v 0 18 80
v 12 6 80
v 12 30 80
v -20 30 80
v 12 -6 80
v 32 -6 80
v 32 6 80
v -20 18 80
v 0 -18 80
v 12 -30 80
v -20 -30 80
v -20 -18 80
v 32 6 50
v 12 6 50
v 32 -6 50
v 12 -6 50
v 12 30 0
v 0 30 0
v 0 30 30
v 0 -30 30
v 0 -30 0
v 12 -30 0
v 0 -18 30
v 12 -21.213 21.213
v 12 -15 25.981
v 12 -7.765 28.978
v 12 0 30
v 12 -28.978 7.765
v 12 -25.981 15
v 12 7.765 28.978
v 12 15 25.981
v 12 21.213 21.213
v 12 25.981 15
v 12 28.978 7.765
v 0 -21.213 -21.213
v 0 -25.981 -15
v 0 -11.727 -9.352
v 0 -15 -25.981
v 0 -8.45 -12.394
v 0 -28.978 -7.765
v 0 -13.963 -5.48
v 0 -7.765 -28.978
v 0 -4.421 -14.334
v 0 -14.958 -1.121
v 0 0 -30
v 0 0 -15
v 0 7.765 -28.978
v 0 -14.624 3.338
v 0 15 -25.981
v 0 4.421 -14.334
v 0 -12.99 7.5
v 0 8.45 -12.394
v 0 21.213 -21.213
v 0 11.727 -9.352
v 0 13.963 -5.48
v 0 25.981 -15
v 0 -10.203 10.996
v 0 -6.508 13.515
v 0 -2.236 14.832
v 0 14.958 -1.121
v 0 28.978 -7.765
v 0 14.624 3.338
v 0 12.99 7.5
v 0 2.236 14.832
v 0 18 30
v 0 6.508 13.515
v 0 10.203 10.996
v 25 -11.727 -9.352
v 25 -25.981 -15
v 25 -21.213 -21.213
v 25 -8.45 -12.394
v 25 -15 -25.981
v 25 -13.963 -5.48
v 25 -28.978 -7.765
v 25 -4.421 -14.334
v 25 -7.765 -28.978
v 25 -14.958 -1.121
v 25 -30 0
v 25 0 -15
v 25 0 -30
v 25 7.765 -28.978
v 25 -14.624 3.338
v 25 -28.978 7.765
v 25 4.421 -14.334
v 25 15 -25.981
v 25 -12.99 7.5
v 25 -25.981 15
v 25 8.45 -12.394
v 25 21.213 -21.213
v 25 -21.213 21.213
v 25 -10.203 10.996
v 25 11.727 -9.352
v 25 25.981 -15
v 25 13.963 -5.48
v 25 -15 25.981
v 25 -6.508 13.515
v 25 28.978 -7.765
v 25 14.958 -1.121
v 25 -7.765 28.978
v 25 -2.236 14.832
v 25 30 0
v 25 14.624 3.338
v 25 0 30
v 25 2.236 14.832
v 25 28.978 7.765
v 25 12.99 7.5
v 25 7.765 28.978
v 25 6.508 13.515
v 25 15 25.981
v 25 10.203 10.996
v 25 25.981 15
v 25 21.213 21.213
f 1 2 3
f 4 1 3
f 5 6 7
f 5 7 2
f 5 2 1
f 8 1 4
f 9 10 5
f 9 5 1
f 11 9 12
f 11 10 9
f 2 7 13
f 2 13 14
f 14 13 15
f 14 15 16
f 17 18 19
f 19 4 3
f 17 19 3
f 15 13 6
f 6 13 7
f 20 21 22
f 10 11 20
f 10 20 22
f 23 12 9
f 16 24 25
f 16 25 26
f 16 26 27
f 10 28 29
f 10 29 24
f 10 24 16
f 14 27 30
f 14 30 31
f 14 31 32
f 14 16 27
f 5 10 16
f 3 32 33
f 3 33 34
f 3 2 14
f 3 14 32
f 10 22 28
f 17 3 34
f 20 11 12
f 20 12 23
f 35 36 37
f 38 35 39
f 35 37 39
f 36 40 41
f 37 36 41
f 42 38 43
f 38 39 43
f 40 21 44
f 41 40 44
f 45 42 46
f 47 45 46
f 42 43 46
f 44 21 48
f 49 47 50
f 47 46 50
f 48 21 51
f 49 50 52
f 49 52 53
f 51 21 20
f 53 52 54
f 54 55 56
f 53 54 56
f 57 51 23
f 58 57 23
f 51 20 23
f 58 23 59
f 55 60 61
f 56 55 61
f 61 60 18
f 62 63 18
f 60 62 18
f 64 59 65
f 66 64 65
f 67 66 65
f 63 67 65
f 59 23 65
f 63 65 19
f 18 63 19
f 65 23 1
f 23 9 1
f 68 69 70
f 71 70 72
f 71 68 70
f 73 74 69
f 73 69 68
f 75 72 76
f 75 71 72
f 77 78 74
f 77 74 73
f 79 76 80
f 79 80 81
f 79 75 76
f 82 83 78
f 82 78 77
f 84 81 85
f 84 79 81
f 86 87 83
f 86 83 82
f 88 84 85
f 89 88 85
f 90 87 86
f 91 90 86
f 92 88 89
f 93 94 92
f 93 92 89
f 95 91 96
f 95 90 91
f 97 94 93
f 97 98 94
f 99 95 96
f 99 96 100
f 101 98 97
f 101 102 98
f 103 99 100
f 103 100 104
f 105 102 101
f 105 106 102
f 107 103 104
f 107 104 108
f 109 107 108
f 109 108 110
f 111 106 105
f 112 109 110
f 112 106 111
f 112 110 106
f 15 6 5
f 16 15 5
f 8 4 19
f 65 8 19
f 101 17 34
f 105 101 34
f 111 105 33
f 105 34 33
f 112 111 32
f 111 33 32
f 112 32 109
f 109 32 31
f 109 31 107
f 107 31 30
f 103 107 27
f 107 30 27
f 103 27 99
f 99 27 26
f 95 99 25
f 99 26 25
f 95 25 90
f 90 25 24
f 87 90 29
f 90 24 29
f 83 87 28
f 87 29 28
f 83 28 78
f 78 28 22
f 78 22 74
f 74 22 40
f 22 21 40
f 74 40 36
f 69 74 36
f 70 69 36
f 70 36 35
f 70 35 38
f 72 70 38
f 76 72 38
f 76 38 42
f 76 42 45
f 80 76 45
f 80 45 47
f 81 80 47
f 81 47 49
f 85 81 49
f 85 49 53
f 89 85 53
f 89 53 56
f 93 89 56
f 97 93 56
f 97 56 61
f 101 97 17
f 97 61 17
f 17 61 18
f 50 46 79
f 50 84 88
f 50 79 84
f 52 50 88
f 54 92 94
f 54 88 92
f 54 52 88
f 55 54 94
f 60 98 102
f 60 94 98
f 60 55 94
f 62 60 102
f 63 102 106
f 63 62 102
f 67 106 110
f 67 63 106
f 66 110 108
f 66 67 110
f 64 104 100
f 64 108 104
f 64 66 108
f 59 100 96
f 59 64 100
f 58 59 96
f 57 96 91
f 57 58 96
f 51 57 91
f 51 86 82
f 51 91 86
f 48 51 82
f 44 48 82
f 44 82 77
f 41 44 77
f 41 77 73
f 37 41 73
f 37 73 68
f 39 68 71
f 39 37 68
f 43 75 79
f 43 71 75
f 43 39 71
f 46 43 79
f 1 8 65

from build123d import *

# Parameters (mm, degrees)
BOSS_EXTRUDE1_DEPTH     = 12
BOSS_EXTRUDE2_DEPTH     = 25
SKETCH2_W               = 20
SKETCH2_H               = 30
BOSS_EXTRUDE3_DEPTH     = 6
BOSS_EXTRUDE4_DEPTH     = 12
CUT_EXTRUDE1_DEPTH      = 97.566039579
CUT_EXTRUDE1_DEPTH_BACK = 97.566039579
SKETCH4_R               = 15


with BuildPart() as part:
    # Sketch1 → Boss-Extrude1 (new body)
    with BuildSketch(Plane.YZ):
        with BuildLine():
            Line((-30, 80), (-30, 0))
            ThreePointArc((-30, 0), (0, 30), (30, 0))
            Line((30, 0), (30, 80))
            Line((30, 80), (-30, 80))
        make_face()
    extrude(amount=BOSS_EXTRUDE1_DEPTH)

    # Sketch1<3> → Boss-Extrude2 (add)
    with BuildSketch(Plane.YZ):
        with BuildLine():
            ThreePointArc((30, 0), (0, 30), (-30, 0))
            ThreePointArc((-30, 0), (0, -30), (30, 0))
        make_face()
    extrude(amount=BOSS_EXTRUDE2_DEPTH)

    # Sketch2 → Boss-Extrude3 (add, symmetric)
    with BuildSketch(Plane(origin=(0, 0, 0), x_dir=(-1, 0, 0), z_dir=(0, 1, 0))):
        with Locations((-22, 65)):
            Rectangle(SKETCH2_W, SKETCH2_H)
    extrude(amount=BOSS_EXTRUDE3_DEPTH, both=True)

    # Sketch3 → Boss-Extrude4 (add)
    with BuildSketch(Plane(origin=(0, 30, 0), x_dir=(-1, 0, 0), z_dir=(0, 1, 0))):
        Polygon((0, 80), (20, 80), (0, 30), align=None)
    boss_extrude4 = extrude(amount=-BOSS_EXTRUDE4_DEPTH)

    # Mirror1: Boss-Extrude4 across plane
    add(boss_extrude4.mirror(Plane.ZX))

    # Sketch4 → Cut-Extrude1 (cut, two sides: drawn at the far end of the back side and taken through both)
    with BuildSketch(Plane.YZ.offset(25).offset(-CUT_EXTRUDE1_DEPTH_BACK)):
        Circle(SKETCH4_R)
    extrude(amount=CUT_EXTRUDE1_DEPTH + CUT_EXTRUDE1_DEPTH_BACK, mode=Mode.SUBTRACT)


solid = part.part
